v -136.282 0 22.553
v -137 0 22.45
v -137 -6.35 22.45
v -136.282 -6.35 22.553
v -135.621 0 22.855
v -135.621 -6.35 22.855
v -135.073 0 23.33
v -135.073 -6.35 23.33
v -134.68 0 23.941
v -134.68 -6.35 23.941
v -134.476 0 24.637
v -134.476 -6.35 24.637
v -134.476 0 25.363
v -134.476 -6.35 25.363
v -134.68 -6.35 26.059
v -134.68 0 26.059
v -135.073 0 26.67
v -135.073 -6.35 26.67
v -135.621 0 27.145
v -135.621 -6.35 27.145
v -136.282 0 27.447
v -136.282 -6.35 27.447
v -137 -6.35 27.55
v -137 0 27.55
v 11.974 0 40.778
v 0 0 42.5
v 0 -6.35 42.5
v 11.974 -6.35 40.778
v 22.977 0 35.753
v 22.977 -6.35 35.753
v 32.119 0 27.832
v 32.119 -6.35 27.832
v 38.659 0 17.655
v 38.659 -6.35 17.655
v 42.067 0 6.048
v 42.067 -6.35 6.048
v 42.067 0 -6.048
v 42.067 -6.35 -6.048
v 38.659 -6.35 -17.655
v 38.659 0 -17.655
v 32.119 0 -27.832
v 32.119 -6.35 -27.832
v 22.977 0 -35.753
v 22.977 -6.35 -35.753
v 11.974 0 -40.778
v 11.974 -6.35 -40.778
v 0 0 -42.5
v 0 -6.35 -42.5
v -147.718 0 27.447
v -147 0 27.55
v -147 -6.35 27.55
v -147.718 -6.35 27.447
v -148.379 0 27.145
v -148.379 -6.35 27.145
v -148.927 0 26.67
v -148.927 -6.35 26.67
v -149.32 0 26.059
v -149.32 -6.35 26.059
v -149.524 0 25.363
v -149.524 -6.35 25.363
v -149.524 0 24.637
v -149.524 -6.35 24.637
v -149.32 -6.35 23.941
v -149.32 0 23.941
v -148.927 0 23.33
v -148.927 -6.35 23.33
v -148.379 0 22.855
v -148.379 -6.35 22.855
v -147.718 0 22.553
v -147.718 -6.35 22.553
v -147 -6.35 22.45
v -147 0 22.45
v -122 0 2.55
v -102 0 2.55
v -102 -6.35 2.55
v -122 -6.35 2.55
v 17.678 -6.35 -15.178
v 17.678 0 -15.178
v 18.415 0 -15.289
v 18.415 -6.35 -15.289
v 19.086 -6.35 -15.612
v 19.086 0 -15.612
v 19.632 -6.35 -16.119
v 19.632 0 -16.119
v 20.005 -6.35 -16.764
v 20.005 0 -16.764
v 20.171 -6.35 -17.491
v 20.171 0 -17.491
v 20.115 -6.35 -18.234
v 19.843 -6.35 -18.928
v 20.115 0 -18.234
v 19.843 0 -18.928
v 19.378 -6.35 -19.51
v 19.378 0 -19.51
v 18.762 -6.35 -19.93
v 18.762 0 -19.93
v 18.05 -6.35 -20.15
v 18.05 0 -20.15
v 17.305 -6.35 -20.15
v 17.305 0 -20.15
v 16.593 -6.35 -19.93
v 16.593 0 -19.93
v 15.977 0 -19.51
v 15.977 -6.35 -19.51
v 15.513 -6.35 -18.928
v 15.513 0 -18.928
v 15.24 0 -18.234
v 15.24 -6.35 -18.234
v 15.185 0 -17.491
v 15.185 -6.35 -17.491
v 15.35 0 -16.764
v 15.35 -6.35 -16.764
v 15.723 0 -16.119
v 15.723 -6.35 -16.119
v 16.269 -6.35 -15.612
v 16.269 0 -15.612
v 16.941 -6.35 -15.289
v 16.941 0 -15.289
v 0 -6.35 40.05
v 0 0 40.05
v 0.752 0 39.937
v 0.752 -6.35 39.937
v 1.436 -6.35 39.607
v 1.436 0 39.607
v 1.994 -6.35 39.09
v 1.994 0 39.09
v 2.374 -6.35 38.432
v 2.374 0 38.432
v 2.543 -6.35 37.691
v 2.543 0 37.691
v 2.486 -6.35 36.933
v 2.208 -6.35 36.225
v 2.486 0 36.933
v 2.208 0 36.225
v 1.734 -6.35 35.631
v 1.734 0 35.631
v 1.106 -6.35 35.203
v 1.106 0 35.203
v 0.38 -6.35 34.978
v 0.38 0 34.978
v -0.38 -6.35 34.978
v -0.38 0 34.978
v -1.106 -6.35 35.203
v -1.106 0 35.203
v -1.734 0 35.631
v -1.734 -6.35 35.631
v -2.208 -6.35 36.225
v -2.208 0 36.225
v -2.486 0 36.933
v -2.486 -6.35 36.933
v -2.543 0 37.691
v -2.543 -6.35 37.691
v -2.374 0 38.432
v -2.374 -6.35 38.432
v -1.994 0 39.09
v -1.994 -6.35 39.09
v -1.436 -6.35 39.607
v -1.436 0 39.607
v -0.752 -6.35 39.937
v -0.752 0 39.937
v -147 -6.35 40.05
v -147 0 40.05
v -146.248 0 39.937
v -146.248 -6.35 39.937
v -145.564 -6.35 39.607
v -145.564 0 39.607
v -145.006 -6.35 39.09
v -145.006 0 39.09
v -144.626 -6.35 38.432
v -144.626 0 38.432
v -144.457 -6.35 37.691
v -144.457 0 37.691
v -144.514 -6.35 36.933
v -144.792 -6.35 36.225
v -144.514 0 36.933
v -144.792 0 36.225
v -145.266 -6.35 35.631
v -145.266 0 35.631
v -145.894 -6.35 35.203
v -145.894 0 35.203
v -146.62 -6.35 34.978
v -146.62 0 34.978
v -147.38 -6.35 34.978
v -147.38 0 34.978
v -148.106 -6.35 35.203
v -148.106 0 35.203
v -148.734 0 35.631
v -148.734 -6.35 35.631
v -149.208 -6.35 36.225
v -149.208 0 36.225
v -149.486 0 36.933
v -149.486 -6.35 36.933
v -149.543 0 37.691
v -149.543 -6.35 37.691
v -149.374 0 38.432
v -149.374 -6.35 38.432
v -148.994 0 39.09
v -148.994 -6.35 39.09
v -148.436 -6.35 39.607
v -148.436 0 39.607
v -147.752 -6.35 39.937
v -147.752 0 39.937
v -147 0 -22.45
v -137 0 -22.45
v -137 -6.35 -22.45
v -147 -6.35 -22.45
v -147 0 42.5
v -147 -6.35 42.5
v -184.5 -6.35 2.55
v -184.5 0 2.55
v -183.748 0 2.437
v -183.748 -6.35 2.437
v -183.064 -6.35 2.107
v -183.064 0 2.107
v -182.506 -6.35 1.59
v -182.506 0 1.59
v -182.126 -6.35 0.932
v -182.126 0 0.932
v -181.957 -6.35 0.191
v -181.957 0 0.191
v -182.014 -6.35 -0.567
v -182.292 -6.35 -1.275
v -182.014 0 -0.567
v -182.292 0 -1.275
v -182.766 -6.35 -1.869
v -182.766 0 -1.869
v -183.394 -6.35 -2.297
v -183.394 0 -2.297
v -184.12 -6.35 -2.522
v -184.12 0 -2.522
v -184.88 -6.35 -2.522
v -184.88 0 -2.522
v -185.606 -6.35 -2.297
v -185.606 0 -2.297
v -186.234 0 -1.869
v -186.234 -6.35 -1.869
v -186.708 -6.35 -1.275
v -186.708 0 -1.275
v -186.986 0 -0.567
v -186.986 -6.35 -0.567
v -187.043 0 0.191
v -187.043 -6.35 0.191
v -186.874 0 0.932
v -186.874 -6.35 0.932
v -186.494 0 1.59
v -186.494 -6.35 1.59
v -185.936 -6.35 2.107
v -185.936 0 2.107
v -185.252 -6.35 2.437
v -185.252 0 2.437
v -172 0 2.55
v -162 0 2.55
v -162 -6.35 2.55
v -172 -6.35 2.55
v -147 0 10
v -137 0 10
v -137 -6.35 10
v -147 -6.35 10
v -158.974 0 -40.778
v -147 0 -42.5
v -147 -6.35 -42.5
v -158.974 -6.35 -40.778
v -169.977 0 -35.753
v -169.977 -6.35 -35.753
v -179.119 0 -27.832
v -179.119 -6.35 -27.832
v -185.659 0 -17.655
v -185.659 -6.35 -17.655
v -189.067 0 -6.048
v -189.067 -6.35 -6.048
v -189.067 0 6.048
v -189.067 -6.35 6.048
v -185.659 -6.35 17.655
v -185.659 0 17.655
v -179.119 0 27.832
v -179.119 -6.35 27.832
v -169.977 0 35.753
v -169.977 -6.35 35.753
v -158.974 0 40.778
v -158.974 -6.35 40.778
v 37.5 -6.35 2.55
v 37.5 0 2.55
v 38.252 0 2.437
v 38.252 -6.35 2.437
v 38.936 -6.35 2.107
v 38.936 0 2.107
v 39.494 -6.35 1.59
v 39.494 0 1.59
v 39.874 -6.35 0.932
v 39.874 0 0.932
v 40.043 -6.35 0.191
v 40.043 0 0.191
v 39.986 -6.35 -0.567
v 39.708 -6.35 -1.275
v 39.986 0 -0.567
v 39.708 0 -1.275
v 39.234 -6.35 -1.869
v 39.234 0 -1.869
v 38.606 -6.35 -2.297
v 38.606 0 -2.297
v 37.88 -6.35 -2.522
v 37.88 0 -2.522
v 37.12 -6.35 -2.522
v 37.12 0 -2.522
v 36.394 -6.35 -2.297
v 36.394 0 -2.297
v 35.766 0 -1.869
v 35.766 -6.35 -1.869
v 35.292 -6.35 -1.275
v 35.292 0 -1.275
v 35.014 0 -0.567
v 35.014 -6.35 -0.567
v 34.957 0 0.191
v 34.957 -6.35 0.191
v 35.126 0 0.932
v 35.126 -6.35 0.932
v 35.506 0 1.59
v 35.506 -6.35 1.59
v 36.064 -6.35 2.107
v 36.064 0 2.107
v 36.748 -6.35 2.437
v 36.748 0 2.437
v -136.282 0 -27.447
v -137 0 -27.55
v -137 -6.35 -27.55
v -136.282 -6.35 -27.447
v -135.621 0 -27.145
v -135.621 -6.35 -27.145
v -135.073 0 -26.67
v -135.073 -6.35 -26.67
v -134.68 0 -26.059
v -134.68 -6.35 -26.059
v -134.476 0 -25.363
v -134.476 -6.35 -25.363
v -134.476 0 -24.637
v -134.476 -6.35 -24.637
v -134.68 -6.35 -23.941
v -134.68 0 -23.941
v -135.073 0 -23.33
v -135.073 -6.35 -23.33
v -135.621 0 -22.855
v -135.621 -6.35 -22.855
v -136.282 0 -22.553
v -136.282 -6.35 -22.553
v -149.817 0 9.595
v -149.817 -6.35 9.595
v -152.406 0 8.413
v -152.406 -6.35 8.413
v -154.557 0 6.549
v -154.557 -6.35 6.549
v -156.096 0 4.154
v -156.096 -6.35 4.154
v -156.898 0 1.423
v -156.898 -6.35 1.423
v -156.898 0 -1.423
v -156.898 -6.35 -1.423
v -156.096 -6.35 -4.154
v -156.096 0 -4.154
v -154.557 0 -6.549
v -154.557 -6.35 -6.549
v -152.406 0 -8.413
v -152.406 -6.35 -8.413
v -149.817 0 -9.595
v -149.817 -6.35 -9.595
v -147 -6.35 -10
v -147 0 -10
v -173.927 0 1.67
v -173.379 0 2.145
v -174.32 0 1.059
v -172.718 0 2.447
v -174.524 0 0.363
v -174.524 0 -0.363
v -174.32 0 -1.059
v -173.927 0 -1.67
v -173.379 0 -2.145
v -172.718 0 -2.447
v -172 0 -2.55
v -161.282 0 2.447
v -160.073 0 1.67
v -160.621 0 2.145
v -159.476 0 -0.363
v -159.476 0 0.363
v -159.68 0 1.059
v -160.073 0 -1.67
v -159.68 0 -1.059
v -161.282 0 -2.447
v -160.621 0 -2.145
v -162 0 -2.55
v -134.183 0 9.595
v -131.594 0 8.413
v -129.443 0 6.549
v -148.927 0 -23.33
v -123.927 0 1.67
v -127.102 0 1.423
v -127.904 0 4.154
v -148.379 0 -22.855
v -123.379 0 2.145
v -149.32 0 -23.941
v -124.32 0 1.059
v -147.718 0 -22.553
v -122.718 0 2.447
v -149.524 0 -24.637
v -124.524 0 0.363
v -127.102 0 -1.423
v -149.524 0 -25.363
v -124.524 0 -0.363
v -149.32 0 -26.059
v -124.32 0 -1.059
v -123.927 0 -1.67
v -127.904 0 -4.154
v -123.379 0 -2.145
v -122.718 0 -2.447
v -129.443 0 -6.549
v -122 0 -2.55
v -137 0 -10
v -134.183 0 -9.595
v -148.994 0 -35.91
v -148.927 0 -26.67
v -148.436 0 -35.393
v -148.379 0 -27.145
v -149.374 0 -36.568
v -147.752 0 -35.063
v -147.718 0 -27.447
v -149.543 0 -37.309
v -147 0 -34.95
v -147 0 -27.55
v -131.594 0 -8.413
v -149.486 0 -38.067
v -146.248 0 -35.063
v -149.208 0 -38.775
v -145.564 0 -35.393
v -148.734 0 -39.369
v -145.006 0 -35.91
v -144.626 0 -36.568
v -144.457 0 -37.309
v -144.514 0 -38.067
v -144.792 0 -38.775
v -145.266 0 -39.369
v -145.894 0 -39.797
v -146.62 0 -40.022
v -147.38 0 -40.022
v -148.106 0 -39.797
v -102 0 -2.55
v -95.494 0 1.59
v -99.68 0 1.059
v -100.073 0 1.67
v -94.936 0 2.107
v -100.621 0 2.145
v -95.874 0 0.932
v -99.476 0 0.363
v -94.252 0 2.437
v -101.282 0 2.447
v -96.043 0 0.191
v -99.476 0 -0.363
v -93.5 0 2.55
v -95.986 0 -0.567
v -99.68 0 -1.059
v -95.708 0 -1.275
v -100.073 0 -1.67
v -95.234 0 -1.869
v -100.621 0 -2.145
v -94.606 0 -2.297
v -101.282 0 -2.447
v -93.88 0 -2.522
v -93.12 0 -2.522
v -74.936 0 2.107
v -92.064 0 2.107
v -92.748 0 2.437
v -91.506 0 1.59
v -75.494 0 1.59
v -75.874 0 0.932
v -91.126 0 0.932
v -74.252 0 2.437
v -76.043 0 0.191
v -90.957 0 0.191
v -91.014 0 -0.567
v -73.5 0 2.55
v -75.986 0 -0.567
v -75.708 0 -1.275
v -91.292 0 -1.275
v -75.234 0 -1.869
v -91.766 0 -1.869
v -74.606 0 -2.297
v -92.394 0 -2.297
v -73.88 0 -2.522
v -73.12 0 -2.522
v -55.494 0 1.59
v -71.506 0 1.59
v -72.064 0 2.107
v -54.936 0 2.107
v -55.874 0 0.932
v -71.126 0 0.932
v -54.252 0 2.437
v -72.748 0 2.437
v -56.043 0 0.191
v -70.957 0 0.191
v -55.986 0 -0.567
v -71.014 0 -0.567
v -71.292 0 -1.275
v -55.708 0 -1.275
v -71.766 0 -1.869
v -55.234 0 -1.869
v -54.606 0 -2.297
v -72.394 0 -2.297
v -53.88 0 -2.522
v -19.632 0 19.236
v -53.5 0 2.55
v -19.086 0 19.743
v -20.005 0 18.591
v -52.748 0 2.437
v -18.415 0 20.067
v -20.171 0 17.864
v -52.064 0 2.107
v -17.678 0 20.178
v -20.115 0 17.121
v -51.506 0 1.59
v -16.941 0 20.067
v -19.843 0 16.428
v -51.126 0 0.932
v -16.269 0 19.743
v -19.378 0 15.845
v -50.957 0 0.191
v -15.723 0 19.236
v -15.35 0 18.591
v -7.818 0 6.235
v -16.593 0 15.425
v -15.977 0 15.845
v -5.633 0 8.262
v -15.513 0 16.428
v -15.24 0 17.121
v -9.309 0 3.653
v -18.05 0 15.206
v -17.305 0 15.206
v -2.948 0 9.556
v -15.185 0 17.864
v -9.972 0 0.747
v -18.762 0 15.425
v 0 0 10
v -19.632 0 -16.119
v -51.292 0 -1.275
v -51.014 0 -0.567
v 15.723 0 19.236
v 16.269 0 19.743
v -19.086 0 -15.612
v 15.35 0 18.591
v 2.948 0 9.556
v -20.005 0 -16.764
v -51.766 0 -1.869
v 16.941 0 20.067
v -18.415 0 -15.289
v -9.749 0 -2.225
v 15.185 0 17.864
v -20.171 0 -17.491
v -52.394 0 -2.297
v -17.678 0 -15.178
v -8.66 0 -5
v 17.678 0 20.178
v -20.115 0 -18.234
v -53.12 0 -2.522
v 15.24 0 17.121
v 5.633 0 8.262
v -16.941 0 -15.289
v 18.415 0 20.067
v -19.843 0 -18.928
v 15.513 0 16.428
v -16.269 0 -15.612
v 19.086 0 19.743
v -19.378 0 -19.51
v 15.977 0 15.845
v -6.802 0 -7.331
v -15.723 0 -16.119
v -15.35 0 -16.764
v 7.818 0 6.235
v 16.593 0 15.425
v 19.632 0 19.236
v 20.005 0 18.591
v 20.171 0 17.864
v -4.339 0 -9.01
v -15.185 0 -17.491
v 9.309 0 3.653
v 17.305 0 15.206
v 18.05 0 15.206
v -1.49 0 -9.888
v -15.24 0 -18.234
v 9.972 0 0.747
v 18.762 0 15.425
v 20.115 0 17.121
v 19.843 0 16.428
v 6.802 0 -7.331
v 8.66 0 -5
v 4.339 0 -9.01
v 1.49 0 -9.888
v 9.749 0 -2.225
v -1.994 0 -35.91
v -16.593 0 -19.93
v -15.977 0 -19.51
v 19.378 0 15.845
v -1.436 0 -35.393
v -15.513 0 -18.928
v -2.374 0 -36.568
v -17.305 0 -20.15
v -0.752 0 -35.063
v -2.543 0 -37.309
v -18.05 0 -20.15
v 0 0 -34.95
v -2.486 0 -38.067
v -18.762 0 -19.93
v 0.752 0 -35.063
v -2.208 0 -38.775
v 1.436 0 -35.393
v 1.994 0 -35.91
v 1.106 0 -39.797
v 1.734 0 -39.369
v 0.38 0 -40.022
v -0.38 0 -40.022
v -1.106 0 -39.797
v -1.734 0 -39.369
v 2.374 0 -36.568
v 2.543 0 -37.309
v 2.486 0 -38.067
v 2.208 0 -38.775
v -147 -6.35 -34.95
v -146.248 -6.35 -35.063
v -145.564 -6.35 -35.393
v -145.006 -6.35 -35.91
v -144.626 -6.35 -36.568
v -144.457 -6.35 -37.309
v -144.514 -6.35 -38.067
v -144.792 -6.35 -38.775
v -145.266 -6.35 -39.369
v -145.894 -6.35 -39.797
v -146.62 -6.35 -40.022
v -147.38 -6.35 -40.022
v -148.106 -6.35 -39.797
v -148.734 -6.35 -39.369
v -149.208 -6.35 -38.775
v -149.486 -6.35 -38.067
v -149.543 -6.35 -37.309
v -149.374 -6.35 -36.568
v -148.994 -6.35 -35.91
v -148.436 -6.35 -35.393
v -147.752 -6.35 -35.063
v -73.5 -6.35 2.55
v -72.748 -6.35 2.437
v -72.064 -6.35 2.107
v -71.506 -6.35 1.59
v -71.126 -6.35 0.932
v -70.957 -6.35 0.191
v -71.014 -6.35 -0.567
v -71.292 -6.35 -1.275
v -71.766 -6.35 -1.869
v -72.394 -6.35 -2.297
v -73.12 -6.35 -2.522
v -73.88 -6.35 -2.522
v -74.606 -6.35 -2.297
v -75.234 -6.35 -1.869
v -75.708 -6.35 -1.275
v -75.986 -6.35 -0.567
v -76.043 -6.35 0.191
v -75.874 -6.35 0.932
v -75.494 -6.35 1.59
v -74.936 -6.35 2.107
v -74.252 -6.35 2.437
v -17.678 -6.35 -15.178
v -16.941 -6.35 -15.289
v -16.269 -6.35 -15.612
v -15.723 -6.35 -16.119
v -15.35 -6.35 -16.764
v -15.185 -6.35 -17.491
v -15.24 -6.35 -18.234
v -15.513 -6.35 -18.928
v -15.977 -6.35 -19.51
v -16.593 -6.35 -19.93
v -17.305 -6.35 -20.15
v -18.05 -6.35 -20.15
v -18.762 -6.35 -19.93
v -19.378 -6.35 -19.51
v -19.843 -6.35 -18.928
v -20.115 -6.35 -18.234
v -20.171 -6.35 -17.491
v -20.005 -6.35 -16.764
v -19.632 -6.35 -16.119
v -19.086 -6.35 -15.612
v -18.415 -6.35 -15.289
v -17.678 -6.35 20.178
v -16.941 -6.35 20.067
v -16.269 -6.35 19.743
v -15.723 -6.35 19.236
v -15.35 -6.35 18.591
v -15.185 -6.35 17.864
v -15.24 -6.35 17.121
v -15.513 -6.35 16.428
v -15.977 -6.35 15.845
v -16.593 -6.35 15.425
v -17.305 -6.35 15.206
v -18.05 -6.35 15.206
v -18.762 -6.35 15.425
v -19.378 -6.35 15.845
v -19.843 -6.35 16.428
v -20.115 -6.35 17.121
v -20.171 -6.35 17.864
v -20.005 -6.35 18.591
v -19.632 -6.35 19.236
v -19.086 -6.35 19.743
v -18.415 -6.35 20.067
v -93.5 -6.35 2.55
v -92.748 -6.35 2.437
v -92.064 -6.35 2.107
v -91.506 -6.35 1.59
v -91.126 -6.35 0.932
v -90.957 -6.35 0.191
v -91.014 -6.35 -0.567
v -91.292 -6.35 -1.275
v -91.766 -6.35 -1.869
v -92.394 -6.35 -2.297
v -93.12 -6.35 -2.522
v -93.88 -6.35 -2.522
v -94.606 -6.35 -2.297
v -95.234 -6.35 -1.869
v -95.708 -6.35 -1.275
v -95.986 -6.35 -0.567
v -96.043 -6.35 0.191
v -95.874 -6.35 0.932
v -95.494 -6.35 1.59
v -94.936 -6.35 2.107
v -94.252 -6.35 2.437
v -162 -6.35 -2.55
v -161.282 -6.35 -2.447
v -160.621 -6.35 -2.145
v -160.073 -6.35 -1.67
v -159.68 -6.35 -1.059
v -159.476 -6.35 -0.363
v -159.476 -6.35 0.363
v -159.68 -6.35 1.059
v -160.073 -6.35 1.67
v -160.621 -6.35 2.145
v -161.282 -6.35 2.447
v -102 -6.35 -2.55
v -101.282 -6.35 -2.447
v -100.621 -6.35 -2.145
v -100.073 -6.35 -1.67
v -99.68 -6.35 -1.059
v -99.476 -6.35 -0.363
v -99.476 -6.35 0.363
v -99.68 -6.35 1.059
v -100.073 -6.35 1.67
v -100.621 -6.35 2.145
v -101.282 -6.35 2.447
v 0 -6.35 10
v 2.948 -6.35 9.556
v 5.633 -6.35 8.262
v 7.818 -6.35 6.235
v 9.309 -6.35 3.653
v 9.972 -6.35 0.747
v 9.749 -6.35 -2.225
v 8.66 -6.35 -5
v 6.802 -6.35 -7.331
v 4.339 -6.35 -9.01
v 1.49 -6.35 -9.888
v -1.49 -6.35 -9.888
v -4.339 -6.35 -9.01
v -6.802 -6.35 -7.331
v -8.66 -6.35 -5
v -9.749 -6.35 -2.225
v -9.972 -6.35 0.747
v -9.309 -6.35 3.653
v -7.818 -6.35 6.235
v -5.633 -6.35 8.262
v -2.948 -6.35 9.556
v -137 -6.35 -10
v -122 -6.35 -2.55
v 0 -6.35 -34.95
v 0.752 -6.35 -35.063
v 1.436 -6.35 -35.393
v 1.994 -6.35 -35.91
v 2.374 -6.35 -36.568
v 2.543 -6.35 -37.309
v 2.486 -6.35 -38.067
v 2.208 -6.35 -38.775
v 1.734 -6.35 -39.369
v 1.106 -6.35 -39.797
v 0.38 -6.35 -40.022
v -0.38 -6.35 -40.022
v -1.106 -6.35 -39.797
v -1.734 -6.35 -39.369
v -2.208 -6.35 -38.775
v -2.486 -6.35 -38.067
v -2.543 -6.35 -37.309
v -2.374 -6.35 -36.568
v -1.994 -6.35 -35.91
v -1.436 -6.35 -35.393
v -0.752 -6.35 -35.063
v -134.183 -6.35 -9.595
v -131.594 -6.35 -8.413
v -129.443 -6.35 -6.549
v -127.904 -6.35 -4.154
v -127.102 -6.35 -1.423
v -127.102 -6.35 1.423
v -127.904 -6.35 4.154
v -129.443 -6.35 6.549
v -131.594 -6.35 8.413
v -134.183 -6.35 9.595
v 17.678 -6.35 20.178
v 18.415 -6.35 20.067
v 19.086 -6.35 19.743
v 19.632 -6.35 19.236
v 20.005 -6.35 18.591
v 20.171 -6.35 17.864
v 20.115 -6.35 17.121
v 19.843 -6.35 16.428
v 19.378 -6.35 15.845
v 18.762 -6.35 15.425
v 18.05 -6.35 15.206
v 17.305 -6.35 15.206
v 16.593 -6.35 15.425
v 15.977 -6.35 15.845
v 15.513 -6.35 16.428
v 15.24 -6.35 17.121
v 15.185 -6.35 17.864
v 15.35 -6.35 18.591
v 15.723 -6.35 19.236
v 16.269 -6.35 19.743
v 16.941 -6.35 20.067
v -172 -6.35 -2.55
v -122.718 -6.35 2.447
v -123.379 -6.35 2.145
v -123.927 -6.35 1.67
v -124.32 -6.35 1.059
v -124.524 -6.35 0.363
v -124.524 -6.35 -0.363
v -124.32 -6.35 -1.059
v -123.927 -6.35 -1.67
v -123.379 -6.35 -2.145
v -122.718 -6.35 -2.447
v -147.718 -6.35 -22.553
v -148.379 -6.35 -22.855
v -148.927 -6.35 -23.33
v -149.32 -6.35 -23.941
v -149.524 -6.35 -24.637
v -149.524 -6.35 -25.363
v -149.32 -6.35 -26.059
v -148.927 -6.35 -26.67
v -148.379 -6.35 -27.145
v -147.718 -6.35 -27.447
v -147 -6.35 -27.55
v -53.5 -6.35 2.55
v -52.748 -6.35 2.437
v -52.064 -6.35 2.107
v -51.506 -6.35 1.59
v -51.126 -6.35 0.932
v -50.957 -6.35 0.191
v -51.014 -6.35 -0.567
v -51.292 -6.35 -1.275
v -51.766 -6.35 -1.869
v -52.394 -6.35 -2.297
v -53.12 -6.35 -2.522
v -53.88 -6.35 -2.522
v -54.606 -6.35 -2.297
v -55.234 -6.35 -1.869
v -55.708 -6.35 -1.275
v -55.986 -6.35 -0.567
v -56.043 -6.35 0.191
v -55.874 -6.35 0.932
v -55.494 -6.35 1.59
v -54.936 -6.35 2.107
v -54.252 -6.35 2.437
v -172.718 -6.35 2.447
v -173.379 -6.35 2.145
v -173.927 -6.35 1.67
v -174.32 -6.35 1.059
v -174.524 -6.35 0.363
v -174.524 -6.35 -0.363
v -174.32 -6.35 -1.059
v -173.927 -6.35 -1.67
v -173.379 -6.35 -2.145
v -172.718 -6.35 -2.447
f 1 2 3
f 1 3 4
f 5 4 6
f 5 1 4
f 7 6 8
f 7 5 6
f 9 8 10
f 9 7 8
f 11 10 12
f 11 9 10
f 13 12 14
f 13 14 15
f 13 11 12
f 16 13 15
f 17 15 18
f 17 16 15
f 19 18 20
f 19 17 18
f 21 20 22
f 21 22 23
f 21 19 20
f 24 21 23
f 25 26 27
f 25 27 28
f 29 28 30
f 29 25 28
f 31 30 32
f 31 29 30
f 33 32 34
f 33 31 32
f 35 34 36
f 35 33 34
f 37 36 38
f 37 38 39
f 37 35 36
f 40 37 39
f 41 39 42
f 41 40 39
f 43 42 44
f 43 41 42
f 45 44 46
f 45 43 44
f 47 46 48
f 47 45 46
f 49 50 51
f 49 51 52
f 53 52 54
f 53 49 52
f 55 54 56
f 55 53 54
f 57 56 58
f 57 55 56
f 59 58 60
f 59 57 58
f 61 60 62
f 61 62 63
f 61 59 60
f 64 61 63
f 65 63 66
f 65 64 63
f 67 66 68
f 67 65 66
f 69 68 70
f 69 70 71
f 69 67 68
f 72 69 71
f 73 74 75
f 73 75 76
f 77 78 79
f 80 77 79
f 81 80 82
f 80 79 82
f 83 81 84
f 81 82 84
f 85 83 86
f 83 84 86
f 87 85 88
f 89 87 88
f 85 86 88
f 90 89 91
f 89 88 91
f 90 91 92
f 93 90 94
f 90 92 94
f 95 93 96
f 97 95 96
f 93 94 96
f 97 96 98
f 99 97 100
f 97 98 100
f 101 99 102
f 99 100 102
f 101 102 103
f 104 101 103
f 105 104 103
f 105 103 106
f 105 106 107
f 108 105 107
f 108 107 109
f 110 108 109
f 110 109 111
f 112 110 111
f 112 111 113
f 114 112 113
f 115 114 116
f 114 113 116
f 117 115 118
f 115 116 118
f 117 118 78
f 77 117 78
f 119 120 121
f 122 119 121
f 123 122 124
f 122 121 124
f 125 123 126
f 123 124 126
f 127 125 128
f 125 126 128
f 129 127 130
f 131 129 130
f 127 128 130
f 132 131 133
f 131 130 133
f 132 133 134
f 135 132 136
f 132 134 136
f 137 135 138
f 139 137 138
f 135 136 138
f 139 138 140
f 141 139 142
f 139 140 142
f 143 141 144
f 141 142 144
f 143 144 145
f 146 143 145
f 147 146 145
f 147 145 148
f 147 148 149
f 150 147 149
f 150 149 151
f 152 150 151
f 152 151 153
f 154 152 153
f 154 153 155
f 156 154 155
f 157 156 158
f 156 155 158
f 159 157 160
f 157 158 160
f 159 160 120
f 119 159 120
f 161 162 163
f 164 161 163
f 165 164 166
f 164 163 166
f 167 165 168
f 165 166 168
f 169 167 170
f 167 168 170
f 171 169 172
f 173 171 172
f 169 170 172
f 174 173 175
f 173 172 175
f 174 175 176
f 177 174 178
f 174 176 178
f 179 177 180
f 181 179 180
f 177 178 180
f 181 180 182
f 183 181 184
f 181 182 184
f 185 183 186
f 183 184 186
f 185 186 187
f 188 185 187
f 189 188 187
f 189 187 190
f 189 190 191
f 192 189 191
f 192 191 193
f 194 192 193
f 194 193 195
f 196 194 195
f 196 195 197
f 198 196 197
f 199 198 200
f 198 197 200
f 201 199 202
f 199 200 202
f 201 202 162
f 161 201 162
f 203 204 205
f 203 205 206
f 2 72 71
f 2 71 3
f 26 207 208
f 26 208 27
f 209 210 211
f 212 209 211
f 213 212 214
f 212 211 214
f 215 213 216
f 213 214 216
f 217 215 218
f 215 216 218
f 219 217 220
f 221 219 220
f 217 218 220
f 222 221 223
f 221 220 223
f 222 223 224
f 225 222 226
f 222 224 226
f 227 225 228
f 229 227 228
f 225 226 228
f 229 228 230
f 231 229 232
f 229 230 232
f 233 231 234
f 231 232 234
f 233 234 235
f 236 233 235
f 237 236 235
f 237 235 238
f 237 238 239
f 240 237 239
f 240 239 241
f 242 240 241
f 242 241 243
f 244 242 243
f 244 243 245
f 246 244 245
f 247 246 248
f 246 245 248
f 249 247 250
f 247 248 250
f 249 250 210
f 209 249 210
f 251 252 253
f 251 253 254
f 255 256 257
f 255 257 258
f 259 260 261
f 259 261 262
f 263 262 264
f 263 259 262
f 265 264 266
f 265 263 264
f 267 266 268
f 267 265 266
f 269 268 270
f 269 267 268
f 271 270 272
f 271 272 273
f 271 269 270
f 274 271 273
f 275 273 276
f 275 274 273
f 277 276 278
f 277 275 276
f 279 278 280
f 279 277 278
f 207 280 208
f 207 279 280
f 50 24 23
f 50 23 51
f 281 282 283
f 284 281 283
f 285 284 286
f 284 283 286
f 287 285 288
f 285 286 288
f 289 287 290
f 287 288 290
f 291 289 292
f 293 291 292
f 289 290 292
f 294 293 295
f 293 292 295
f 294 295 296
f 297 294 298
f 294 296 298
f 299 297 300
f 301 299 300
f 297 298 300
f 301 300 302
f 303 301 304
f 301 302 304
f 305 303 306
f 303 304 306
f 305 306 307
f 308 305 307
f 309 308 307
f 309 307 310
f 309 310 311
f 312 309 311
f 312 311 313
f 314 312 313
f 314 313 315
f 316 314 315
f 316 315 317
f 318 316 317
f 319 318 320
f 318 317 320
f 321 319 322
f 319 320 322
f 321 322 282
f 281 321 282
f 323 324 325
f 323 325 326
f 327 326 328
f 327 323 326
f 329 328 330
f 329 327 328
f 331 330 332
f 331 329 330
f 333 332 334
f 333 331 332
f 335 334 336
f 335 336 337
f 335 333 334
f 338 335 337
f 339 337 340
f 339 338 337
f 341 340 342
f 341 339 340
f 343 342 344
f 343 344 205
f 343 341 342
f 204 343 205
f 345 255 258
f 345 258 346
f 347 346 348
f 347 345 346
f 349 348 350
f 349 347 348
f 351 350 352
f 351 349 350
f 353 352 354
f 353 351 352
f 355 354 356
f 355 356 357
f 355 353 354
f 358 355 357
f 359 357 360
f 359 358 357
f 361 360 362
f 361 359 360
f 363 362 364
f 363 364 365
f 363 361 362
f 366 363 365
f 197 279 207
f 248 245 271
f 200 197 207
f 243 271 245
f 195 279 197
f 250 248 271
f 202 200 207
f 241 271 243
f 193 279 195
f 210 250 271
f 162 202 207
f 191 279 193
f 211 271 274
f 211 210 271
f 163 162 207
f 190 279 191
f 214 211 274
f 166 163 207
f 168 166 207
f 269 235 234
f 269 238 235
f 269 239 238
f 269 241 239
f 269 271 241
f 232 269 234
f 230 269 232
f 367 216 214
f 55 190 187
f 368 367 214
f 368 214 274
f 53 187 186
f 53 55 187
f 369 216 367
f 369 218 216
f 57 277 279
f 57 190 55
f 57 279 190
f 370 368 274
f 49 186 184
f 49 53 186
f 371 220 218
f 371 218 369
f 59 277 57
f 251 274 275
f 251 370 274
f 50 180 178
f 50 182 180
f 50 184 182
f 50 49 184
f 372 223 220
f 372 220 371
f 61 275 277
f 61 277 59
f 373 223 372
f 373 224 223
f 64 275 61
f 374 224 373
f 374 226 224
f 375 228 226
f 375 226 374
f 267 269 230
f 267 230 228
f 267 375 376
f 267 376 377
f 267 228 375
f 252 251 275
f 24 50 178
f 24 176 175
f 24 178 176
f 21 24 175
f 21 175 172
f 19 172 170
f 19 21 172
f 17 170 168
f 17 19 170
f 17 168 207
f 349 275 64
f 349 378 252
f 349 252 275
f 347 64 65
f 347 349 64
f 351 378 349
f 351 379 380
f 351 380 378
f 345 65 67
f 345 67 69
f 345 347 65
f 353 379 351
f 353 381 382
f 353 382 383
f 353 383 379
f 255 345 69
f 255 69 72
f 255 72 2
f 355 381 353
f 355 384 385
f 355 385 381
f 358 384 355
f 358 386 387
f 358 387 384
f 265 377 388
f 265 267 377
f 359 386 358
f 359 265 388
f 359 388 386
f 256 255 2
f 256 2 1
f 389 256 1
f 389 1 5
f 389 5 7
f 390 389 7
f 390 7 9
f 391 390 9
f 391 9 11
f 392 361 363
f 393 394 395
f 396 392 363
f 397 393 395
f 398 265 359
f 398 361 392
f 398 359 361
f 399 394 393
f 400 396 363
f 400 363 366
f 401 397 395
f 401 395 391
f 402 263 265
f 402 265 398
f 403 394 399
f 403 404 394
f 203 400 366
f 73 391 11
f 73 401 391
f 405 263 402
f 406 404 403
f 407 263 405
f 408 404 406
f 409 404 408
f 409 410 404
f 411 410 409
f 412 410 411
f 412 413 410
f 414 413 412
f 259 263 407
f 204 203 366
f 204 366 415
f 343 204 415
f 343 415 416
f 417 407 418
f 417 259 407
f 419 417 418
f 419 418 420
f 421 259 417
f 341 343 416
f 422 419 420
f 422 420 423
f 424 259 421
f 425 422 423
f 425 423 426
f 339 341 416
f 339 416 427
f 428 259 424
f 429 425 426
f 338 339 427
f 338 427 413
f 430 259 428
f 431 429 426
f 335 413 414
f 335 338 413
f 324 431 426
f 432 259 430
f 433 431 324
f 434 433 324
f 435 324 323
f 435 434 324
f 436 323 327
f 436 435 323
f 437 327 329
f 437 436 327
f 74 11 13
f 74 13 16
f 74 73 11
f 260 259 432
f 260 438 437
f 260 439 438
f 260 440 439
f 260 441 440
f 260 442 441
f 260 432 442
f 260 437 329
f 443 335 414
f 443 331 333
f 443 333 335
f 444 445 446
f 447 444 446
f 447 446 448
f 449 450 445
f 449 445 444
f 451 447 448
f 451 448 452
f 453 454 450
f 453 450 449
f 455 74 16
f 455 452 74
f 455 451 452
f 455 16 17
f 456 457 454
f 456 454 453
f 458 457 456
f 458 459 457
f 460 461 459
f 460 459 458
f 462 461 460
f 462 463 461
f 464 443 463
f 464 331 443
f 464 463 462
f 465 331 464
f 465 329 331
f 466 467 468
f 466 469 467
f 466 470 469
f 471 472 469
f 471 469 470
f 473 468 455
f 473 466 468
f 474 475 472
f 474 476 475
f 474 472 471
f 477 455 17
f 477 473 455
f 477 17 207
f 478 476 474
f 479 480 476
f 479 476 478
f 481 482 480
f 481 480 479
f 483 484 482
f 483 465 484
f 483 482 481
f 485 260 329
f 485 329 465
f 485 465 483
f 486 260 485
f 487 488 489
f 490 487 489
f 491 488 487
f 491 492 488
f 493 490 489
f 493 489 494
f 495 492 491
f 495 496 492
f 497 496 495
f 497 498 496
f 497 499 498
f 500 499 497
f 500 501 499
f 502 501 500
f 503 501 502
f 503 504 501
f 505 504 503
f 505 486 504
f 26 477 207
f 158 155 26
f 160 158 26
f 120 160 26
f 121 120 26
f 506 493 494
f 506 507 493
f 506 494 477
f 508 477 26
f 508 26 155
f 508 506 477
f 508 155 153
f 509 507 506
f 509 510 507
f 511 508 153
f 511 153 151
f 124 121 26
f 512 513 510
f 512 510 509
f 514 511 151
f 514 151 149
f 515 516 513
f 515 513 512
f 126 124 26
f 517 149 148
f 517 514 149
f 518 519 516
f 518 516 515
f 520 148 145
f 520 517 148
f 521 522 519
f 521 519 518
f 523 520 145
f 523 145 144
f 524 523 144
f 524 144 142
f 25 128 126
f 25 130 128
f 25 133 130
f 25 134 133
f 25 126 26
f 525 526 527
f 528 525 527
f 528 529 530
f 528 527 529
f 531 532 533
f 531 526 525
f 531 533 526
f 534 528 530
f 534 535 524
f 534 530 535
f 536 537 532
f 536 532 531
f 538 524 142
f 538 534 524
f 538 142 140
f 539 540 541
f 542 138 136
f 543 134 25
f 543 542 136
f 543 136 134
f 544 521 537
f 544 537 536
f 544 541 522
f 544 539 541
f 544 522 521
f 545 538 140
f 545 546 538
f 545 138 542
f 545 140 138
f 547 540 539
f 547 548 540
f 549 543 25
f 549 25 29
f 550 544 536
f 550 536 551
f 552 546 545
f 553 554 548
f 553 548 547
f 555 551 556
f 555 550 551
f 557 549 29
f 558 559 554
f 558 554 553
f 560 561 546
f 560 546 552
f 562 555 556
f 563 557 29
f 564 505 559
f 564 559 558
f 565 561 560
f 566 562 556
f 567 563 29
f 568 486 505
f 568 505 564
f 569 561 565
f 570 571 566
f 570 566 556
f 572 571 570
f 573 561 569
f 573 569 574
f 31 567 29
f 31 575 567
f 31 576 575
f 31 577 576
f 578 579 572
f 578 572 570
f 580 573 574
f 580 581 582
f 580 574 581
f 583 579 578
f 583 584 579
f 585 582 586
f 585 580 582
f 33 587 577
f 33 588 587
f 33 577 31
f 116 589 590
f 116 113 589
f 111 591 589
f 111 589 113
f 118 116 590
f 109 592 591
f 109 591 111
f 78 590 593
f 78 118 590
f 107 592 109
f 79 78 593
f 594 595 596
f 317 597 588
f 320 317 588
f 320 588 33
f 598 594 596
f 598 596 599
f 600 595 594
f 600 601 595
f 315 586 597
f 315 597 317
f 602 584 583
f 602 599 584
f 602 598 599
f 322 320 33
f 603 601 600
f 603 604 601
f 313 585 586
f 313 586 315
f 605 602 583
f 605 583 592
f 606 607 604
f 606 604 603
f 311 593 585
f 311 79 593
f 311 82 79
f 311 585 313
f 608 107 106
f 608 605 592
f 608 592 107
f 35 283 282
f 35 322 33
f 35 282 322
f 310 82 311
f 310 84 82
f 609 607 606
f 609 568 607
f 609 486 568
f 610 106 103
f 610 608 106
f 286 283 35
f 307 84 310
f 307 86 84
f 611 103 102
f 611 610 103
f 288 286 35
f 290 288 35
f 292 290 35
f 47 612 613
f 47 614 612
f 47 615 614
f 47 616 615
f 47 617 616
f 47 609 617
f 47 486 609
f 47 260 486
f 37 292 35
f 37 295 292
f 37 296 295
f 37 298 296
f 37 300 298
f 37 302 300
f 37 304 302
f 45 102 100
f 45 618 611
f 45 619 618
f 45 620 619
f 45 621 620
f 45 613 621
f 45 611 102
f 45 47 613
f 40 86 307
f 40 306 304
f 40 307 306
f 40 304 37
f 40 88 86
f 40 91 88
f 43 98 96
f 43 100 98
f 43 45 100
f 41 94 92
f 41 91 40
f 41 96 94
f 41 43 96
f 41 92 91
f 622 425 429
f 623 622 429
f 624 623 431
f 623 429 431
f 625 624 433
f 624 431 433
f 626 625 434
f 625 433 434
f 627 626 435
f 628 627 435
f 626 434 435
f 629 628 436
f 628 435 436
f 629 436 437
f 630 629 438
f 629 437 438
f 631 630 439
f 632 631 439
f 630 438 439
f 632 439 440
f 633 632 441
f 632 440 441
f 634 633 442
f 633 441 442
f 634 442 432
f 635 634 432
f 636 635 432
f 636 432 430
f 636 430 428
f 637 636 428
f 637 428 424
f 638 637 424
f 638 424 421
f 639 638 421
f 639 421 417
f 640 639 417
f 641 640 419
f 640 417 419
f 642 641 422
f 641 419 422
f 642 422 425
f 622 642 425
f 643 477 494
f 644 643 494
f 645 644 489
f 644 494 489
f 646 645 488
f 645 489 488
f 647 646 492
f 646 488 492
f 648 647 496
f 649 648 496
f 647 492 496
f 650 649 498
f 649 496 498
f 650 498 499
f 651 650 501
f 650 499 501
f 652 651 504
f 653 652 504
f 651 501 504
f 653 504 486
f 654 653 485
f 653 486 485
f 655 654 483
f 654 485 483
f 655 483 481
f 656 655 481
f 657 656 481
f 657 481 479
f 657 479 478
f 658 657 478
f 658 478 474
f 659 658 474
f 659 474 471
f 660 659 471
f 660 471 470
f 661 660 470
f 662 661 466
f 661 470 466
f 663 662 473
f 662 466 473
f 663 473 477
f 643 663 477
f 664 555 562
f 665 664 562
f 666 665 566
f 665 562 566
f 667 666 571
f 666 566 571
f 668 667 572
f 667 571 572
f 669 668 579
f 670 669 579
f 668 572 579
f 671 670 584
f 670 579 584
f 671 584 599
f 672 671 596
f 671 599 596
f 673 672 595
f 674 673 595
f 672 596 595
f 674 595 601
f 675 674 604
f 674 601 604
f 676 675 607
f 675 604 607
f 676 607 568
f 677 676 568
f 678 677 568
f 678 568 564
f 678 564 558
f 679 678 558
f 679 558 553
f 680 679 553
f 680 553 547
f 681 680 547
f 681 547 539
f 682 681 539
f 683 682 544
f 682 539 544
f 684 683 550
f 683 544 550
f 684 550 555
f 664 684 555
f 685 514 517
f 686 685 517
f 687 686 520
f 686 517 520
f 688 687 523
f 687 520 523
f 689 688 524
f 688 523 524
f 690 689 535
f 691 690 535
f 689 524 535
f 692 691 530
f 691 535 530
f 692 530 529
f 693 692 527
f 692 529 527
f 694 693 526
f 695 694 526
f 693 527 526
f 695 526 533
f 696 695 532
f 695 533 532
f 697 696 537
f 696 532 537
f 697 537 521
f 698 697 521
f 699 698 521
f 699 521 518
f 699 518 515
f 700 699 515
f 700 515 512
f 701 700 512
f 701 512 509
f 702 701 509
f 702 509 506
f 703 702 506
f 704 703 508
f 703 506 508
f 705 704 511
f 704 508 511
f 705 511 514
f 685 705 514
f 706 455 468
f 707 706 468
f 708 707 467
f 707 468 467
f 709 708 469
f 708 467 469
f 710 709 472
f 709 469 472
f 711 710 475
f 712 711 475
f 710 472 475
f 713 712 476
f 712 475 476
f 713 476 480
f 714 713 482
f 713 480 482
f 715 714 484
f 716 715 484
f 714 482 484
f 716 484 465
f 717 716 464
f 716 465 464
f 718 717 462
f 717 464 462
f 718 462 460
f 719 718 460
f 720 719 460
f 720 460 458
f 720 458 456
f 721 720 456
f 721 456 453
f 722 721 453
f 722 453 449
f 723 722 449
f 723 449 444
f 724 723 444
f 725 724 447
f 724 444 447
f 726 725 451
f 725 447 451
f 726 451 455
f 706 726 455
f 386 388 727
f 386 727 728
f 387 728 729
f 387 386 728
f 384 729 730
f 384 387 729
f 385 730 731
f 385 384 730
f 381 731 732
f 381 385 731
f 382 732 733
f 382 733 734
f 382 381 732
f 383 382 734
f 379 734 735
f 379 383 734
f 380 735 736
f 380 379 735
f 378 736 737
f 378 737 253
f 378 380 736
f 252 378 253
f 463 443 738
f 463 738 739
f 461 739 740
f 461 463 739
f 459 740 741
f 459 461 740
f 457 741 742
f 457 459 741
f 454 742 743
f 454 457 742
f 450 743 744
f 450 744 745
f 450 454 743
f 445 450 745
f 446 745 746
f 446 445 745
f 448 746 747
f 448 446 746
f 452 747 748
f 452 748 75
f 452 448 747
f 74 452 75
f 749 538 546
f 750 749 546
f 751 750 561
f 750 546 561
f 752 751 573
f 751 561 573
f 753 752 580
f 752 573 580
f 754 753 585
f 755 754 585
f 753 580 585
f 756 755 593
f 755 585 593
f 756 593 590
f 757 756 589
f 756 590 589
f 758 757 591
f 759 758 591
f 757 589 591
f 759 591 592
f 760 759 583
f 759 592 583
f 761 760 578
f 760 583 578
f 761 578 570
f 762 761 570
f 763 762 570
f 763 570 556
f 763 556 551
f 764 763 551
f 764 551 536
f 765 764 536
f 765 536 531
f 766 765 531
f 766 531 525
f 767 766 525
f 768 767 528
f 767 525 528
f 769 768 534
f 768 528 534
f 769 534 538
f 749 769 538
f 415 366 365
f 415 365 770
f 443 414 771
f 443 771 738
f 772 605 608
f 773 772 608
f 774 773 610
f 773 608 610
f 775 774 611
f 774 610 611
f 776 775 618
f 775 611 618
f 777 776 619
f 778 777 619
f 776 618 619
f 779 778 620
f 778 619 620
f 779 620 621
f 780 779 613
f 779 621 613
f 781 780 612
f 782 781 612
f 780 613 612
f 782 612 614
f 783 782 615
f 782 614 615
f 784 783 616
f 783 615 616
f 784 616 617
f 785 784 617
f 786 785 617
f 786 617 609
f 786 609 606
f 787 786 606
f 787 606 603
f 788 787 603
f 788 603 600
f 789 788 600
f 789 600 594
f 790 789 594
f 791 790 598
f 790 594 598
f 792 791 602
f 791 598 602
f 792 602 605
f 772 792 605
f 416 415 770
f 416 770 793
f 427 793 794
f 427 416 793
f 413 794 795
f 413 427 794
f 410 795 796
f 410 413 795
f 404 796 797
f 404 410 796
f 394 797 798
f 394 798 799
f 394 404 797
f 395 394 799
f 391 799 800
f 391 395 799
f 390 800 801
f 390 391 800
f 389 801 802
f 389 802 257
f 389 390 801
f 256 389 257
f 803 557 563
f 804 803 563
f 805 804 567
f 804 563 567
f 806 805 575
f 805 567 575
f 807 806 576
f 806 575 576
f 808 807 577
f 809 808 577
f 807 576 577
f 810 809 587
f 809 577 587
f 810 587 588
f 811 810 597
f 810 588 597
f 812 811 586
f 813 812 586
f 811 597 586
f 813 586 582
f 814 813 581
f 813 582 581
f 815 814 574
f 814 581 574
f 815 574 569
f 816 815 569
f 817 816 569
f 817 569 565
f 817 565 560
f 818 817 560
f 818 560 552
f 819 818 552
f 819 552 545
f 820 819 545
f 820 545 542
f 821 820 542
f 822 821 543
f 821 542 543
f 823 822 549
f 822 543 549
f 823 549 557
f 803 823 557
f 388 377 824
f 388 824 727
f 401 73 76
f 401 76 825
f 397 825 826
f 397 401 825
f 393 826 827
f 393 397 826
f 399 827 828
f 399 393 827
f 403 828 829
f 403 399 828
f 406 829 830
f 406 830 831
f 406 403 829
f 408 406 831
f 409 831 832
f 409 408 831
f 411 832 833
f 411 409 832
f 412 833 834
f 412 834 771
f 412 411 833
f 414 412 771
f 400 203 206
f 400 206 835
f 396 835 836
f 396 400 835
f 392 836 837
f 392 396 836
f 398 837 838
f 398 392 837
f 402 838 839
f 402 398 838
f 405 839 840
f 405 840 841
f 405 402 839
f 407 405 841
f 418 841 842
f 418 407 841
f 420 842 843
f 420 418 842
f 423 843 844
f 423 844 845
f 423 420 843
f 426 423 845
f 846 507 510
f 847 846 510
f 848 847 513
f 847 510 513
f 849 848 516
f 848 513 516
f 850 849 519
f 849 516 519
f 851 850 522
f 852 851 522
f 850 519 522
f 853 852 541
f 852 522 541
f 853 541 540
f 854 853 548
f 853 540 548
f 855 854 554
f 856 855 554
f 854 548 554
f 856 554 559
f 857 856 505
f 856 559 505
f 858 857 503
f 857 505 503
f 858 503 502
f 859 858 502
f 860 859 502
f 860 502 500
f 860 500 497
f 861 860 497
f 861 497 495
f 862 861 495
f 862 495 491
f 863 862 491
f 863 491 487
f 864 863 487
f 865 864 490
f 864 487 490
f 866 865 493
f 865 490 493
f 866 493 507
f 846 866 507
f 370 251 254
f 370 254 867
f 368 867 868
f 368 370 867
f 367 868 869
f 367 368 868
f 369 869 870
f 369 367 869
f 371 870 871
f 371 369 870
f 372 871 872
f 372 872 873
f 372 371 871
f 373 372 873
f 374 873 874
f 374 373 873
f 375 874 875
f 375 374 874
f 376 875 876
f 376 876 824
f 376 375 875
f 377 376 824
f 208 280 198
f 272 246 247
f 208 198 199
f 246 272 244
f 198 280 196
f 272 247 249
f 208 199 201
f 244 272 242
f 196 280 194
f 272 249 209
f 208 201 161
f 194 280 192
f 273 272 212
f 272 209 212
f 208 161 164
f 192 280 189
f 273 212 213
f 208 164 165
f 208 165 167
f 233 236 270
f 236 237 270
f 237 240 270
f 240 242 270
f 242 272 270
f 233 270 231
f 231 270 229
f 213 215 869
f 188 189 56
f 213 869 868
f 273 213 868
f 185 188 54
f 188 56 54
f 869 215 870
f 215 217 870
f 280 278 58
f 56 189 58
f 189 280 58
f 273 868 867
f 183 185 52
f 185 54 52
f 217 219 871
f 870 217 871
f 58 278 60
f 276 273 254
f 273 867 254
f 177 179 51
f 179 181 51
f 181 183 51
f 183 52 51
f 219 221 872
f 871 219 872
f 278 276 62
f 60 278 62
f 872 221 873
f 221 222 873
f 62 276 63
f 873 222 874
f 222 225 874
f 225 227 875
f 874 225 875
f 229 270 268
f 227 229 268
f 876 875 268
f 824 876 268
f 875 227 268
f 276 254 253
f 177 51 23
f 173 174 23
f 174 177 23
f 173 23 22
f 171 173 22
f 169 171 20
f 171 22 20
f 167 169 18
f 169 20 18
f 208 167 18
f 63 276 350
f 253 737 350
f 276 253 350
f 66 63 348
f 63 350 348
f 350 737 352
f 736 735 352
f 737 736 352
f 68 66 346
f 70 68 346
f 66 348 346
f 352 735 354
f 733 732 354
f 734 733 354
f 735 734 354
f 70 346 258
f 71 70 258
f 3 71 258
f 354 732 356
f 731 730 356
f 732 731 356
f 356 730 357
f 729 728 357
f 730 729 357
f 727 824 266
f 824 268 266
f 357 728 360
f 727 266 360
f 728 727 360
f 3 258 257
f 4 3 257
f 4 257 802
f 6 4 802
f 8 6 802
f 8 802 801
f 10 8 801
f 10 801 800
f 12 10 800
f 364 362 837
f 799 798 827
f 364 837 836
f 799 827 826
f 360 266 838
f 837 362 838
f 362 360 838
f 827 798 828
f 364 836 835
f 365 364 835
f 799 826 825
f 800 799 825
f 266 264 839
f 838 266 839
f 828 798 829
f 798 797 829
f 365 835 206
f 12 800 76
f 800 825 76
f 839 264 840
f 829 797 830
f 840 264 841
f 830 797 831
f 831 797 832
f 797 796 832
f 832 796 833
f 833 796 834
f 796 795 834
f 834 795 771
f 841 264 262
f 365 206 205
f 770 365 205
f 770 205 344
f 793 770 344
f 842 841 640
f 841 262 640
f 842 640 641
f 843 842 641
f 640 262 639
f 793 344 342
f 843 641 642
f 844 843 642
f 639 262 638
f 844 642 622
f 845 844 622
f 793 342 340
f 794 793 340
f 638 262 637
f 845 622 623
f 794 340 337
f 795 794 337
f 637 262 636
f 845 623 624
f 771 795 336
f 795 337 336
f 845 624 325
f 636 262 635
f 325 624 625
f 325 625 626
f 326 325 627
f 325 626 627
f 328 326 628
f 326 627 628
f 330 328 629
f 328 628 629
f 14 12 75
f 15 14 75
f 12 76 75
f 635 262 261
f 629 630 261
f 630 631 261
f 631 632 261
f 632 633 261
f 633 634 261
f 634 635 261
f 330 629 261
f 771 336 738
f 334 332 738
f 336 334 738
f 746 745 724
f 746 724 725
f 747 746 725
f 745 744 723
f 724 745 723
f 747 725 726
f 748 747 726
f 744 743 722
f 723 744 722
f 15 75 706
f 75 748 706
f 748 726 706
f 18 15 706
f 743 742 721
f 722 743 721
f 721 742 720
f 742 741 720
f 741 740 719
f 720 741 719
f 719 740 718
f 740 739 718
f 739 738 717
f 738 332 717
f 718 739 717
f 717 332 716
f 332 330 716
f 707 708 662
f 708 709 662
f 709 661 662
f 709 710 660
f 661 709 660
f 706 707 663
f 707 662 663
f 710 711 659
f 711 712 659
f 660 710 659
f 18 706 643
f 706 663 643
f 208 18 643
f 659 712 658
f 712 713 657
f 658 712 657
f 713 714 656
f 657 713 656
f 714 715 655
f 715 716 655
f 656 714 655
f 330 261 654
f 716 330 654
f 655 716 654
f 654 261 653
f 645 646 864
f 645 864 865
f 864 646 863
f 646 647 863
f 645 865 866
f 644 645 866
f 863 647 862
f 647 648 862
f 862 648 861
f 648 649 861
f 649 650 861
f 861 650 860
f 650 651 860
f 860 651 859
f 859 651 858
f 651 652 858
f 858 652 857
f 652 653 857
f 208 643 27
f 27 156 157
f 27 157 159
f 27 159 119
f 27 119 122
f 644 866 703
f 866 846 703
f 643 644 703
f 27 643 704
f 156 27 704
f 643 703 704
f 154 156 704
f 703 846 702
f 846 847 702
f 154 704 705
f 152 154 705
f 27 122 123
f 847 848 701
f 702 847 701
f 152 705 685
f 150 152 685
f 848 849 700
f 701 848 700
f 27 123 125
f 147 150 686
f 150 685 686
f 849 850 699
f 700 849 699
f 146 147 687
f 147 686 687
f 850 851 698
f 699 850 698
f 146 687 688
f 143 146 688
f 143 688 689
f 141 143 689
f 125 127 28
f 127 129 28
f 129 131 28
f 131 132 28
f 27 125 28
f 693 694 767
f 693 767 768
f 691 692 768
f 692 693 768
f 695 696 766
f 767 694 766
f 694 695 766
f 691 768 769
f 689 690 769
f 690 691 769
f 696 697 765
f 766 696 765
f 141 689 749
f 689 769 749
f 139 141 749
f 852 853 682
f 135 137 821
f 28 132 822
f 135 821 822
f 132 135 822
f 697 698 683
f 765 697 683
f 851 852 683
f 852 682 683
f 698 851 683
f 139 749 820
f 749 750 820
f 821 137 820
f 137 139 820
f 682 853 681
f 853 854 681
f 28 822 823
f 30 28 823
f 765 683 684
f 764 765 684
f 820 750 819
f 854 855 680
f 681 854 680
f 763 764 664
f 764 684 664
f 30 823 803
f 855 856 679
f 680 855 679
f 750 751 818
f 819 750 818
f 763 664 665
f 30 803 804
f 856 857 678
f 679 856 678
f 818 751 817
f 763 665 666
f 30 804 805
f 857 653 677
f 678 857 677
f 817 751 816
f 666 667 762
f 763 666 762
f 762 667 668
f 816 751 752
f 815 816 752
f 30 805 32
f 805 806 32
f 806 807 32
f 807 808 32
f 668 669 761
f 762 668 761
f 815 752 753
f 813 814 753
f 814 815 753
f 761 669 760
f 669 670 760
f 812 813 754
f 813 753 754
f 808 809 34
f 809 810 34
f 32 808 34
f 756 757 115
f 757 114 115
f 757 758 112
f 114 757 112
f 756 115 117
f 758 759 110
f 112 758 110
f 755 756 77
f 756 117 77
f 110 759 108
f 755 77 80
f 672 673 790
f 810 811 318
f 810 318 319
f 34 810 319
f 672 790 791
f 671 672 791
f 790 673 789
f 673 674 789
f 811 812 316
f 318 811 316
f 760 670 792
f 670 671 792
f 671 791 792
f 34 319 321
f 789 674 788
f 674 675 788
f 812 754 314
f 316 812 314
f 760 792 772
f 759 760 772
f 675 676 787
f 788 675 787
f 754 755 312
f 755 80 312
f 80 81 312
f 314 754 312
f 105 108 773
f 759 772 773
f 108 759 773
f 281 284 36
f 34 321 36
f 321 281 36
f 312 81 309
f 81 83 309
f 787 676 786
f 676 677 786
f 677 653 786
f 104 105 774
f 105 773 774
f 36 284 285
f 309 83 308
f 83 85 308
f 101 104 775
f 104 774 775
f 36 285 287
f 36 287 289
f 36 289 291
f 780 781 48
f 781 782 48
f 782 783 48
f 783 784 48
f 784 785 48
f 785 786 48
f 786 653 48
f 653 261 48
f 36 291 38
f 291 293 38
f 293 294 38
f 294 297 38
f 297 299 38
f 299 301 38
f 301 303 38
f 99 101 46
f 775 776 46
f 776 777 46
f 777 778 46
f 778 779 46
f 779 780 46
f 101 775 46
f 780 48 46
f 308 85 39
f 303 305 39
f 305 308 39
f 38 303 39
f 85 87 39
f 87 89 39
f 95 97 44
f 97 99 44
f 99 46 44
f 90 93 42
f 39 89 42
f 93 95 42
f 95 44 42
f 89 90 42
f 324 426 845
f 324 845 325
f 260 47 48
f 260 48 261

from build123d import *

# Parameters (mm, degrees)
SKETCH1_R           = 2.55
SKETCH1_R_2         = 2.5
SKETCH1_R_3         = 10
BOSS_EXTRUDE1_DEPTH = 6.35


with BuildPart() as part:
    # Sketch1 → Boss-Extrude1 (new body)
    with BuildSketch(Plane(origin=(0, 0, 0), x_dir=(1, 0, 0), z_dir=(0, 1, 0))):
        with BuildLine():
            ThreePointArc((-147, 42.5), (-189.5, 0), (-147, -42.5))
            Line((-147, -42.5), (0, -42.5))
            ThreePointArc((0, -42.5), (42.5, 0), (0, 42.5))
            Line((0, 42.5), (-147, 42.5))
        make_face()
        with BuildLine():
            Line((-122, 2.55), (-102, 2.55))
            ThreePointArc((-102, 2.55), (-99.45, 0), (-102, -2.55))
            Line((-102, -2.55), (-122, -2.55))
            ThreePointArc((-122, -2.55), (-124.55, 0), (-122, 2.55))
        make_face(mode=Mode.SUBTRACT)
        with Locations(Location((-147, -37.5, 0), (0, 0, 270))):
            Circle(SKETCH1_R, mode=Mode.SUBTRACT)
        with BuildLine():
            ThreePointArc((-147, -27.55), (-149.55, -25), (-147, -22.45))
            Line((-147, -22.45), (-137, -22.45))
            ThreePointArc((-137, -22.45), (-134.45, -25), (-137, -27.55))
            Line((-137, -27.55), (-147, -27.55))
        make_face(mode=Mode.SUBTRACT)
        with Locations(Location((-184.5, 0, 0), (0, 0, 270))):
            Circle(SKETCH1_R, mode=Mode.SUBTRACT)
        with BuildLine():
            ThreePointArc((-172, -2.55), (-174.55, 0), (-172, 2.55))
            Line((-172, 2.55), (-162, 2.55))
            ThreePointArc((-162, 2.55), (-159.45, 0), (-162, -2.55))
            Line((-162, -2.55), (-172, -2.55))
        make_face(mode=Mode.SUBTRACT)
        with BuildLine():
            ThreePointArc((-147, -10), (-157, 0), (-147, 10))
            Line((-147, 10), (-137, 10))
            ThreePointArc((-137, 10), (-127, 0), (-137, -10))
            Line((-137, -10), (-147, -10))
        make_face(mode=Mode.SUBTRACT)
        with BuildLine():
            ThreePointArc((-147, 22.45), (-149.55, 25), (-147, 27.55))
            Line((-147, 27.55), (-137, 27.55))
            ThreePointArc((-137, 27.55), (-134.45, 25), (-137, 22.45))
            Line((-137, 22.45), (-147, 22.45))
        make_face(mode=Mode.SUBTRACT)
        with Locations(Location((-147, 37.5, 0), (0, 0, 270))):
            Circle(SKETCH1_R, mode=Mode.SUBTRACT)
        with Locations(Location((-73.5, 0, 0), (0, 0, 270))):
            Circle(SKETCH1_R, mode=Mode.SUBTRACT)
        with Locations(Location((-53.5, 0, 0), (0, 0, 270))):
            Circle(SKETCH1_R, mode=Mode.SUBTRACT)
        with Locations(Location((-93.5, 0, 0), (0, 0, 270))):
            Circle(SKETCH1_R, mode=Mode.SUBTRACT)
        with Locations(Location((0, 37.5, 0), (0, 0, 270))):
            Circle(SKETCH1_R, mode=Mode.SUBTRACT)
        with Locations(Location((0, -37.5, 0), (0, 0, 270))):
            Circle(SKETCH1_R, mode=Mode.SUBTRACT)
        with Locations(Location((-17.67766953, -17.67766953, 0), (0, 0, 270))):
            Circle(SKETCH1_R_2, mode=Mode.SUBTRACT)
        with Locations(Location((17.67766953, -17.67766953, 0), (0, 0, 270))):
            Circle(SKETCH1_R_2, mode=Mode.SUBTRACT)
        with Locations(Location((-17.67766953, 17.67766953, 0), (0, 0, 270))):
            Circle(SKETCH1_R_2, mode=Mode.SUBTRACT)
        with Locations(Location((0, 0, 0), (0, 0, 270))):
            Circle(SKETCH1_R_3, mode=Mode.SUBTRACT)
        with Locations(Location((37.5, 0, 0), (0, 0, 270))):
            Circle(SKETCH1_R, mode=Mode.SUBTRACT)
        with Locations(Location((17.67766953, 17.67766953, 0), (0, 0, 270))):
            Circle(SKETCH1_R_2, mode=Mode.SUBTRACT)
    extrude(amount=-BOSS_EXTRUDE1_DEPTH)


solid = part.part
